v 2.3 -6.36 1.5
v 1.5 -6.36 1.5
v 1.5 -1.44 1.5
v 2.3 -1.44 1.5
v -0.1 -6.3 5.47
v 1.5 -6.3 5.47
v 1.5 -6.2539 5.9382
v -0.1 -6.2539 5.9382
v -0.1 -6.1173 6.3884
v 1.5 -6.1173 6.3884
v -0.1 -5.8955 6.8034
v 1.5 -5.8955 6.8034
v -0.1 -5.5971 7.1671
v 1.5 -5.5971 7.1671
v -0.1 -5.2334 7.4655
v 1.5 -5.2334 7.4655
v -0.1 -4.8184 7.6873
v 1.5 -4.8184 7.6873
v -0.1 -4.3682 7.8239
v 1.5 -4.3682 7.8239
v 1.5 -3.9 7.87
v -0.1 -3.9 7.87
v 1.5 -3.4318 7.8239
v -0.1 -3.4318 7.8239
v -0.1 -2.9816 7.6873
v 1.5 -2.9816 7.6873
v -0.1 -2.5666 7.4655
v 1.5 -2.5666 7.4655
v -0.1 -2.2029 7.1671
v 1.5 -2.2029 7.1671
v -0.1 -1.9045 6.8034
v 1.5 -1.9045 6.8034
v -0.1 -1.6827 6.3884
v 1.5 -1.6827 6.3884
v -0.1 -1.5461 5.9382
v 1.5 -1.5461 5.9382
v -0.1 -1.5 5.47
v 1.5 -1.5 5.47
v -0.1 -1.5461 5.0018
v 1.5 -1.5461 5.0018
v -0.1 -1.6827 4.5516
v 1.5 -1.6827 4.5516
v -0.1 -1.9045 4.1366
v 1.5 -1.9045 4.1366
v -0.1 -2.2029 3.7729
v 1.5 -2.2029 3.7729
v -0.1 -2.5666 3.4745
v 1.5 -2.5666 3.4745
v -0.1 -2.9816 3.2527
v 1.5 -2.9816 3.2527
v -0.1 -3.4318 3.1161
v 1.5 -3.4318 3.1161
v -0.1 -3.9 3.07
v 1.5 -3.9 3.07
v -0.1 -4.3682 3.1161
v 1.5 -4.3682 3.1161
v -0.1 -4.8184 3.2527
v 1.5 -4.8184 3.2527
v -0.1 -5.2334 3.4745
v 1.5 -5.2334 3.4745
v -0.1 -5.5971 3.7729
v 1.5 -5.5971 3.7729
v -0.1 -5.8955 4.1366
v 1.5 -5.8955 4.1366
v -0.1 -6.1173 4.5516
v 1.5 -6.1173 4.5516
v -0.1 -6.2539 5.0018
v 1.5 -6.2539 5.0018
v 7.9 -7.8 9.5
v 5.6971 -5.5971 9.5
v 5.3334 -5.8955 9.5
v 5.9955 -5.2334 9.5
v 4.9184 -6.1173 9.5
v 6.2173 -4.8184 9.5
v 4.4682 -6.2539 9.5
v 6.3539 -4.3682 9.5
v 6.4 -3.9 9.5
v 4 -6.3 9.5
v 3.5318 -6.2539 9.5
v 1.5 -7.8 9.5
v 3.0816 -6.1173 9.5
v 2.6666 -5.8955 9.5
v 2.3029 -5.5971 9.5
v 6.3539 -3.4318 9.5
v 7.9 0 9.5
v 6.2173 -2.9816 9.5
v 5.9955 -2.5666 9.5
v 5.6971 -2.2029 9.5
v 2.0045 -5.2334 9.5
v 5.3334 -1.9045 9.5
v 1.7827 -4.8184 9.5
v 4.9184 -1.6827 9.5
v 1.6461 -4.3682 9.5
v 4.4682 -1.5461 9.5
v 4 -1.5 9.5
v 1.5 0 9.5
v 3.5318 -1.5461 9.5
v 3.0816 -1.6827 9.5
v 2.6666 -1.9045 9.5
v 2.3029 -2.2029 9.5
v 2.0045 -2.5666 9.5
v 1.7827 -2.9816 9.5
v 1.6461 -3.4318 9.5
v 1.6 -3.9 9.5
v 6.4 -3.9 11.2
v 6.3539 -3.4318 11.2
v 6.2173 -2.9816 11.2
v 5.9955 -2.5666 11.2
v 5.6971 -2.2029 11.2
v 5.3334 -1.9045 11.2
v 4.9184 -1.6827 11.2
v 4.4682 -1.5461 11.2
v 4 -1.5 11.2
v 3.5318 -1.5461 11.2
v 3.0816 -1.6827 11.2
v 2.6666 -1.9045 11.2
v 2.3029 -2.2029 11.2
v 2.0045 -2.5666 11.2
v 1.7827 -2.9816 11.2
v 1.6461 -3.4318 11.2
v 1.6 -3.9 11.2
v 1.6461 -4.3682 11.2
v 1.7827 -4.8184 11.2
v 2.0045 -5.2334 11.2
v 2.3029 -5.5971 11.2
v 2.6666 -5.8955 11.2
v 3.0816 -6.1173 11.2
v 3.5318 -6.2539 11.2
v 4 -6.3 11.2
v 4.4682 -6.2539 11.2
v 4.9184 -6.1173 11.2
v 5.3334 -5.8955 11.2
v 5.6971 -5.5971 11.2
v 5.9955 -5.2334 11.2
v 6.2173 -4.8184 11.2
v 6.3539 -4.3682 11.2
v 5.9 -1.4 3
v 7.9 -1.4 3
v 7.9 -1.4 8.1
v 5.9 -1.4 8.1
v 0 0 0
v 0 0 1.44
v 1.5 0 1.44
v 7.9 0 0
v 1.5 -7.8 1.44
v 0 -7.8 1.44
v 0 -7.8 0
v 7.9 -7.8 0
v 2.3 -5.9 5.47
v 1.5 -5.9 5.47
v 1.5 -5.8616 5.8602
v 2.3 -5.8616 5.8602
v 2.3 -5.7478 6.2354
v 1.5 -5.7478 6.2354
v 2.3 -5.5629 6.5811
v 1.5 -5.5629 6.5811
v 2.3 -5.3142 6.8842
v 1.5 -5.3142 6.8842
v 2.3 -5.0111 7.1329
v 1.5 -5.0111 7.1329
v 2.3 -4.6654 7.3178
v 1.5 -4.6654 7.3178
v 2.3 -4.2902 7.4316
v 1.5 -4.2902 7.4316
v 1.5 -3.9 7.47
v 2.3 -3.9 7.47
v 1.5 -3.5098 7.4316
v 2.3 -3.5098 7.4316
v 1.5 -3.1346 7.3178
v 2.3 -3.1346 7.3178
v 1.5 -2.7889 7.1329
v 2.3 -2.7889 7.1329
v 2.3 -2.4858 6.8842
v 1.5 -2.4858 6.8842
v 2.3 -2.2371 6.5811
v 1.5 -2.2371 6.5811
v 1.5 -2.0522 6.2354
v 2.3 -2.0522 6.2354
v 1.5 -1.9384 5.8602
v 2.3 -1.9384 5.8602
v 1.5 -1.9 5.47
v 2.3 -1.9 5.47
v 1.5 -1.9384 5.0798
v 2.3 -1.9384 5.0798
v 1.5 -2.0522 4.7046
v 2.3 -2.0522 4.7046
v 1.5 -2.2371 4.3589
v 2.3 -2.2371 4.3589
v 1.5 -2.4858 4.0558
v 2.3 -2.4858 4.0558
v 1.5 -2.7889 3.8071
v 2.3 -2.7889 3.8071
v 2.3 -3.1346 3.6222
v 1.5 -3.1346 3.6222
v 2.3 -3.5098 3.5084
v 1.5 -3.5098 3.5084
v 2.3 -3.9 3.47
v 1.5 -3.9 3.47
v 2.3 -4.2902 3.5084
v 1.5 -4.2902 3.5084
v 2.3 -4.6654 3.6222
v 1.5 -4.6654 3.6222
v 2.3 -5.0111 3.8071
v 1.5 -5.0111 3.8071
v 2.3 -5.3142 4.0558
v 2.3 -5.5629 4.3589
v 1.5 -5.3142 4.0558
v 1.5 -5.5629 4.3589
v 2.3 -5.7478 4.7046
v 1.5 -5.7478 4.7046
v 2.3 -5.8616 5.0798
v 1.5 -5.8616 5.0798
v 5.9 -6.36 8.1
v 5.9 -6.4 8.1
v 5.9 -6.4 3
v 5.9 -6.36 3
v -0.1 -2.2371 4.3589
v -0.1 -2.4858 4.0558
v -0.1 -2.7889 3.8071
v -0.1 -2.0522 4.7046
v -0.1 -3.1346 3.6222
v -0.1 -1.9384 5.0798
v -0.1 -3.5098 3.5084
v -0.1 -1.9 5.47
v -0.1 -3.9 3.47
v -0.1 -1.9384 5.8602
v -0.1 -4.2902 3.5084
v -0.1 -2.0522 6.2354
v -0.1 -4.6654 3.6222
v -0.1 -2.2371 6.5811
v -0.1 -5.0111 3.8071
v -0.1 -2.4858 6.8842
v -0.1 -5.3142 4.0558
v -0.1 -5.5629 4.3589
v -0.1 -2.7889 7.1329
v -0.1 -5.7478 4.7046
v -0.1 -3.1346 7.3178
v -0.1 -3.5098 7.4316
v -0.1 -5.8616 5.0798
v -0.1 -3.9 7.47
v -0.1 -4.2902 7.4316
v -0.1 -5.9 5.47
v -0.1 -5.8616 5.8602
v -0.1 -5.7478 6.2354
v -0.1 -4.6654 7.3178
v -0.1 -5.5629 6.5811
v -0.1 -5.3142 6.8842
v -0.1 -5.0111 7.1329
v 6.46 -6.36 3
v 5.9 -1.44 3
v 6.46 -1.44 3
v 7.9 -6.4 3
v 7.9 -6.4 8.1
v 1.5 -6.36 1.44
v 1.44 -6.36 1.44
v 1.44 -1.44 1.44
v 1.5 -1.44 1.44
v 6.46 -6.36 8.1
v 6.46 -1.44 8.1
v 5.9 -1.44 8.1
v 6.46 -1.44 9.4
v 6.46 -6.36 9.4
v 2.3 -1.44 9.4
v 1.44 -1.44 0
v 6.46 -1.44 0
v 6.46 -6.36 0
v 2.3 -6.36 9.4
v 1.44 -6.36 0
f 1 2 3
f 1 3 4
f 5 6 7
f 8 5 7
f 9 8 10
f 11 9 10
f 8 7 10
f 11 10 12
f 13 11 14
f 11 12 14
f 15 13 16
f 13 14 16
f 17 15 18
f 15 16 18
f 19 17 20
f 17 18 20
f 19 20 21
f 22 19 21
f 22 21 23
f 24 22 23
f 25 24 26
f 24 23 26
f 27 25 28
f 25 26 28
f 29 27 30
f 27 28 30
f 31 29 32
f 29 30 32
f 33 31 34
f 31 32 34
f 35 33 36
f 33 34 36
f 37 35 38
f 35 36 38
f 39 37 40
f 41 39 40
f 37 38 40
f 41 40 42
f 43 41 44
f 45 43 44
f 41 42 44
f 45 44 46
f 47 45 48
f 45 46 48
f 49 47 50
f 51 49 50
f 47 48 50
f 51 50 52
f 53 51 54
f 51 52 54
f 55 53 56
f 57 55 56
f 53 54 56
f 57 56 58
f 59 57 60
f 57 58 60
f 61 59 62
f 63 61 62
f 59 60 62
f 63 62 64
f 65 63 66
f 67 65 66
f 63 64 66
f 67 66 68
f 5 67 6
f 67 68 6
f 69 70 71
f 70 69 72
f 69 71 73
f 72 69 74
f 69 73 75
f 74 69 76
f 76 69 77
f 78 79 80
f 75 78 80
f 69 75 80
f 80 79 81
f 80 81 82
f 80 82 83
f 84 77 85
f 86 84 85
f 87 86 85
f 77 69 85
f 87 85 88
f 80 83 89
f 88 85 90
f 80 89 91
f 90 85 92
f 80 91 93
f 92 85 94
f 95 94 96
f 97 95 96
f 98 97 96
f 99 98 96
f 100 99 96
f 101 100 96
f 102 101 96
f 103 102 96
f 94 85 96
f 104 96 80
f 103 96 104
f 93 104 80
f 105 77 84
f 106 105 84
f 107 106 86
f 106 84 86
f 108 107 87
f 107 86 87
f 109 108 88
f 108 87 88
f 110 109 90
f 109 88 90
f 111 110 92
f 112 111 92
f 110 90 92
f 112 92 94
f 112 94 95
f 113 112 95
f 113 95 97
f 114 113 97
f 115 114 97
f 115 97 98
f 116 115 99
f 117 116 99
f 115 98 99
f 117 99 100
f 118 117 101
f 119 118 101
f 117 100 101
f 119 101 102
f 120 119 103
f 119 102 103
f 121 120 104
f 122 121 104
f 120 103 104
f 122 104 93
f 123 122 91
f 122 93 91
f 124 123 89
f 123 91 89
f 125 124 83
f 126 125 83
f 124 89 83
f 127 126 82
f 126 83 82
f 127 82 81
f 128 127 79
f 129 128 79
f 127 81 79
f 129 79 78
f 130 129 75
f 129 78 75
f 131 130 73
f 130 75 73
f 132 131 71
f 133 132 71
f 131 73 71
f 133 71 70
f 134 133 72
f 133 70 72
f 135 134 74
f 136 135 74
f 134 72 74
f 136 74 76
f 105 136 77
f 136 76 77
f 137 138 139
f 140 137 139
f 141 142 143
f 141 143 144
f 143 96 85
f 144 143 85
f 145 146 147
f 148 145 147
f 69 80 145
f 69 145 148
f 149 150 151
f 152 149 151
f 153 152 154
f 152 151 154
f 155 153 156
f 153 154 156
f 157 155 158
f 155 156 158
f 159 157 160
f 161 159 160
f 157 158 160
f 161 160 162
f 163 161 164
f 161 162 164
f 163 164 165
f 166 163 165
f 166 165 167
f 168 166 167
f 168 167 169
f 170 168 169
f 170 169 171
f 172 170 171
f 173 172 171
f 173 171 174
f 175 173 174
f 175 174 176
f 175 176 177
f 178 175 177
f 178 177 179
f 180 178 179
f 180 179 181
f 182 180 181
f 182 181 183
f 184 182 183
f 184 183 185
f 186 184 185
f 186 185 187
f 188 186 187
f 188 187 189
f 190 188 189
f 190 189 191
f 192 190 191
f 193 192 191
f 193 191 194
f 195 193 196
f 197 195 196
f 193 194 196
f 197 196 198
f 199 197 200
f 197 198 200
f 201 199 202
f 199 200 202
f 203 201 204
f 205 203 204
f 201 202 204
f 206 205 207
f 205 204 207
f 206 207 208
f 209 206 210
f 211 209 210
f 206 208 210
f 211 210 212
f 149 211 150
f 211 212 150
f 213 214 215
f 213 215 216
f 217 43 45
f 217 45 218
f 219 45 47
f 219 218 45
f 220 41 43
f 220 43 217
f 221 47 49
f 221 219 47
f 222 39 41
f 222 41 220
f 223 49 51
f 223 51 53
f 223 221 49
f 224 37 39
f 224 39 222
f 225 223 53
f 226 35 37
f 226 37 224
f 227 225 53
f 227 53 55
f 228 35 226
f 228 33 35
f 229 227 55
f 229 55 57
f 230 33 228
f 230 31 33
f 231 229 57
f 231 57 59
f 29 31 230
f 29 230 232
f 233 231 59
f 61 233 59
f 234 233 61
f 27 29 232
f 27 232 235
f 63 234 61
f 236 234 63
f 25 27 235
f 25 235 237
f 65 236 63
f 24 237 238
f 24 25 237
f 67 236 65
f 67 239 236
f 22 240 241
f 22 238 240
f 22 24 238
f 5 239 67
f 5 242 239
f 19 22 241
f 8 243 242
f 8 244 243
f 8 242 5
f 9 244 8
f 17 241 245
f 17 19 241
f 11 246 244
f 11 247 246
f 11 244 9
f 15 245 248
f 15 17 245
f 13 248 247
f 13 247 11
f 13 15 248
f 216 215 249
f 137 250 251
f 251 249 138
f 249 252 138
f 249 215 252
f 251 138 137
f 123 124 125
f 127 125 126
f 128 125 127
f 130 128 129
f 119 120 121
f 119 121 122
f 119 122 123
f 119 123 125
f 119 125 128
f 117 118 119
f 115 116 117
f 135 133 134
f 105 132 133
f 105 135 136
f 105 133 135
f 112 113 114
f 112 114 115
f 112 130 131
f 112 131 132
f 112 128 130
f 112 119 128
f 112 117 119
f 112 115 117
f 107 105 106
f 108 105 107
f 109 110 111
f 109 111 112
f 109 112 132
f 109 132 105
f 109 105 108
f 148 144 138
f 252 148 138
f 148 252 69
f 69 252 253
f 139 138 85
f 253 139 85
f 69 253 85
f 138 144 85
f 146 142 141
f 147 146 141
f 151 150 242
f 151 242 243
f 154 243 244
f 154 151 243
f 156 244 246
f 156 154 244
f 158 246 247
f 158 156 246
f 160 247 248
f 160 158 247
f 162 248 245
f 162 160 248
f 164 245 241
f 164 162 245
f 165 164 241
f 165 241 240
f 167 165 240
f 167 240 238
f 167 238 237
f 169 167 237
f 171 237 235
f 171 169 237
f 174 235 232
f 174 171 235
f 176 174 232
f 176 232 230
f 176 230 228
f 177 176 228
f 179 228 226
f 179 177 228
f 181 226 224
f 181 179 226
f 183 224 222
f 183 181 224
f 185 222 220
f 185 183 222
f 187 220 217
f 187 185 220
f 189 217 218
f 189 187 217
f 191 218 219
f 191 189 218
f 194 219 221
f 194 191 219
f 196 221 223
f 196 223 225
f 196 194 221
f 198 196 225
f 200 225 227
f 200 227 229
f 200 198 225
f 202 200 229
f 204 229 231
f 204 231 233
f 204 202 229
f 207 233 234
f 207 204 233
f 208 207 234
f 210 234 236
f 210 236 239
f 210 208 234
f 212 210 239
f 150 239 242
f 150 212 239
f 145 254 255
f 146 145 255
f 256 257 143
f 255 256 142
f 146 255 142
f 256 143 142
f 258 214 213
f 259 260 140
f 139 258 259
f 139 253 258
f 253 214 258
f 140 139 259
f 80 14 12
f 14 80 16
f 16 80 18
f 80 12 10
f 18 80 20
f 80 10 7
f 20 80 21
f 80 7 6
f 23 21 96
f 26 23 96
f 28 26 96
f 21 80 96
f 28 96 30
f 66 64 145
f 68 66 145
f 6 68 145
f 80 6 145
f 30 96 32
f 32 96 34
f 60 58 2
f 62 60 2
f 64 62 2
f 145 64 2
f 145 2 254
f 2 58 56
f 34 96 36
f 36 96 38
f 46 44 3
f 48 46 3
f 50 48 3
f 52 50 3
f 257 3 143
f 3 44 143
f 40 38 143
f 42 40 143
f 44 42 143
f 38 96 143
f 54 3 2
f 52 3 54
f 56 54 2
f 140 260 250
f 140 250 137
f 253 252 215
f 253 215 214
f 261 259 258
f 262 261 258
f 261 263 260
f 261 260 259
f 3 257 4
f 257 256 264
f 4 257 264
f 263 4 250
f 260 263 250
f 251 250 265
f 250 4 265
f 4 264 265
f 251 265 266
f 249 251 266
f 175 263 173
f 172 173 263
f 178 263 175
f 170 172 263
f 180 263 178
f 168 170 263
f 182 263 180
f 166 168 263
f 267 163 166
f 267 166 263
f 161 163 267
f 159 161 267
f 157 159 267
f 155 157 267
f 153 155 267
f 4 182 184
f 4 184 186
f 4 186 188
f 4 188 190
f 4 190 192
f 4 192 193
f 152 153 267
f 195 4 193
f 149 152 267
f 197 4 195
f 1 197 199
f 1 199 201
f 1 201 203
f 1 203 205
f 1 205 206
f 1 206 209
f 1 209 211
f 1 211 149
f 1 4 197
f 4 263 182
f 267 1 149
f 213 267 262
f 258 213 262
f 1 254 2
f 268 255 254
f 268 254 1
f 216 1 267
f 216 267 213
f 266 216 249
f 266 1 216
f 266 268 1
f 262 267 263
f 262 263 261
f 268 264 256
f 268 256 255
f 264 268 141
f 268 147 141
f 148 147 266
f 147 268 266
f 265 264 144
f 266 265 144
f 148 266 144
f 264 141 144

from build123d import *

# Parameters (mm, degrees)
F1_DEPTH  = 7.8
F2_R      = 2.4
F3_DEPTH  = 1.7
F4_W      = 5.02
F4_H      = 4.92
F5_DEPTH  = 1.5
F6_W      = 4.16
F6_H      = 4.92
F7_DEPTH  = 7.9
F8_R      = 2.4
F8_R_2    = 2
F9_DEPTH  = 1.6
F10_DEPTH = 1
F11_W     = 5
F11_H     = 5.1
F12_DEPTH = 2


with BuildPart() as f1:
    # F0 (on Front) → F1 (new body)
    with BuildSketch(Plane.XZ):
        Polygon((0, 1.44), (0, 0), (7.9, 0), (7.9, 9.5), (1.5, 9.5), (1.5, 1.44), align=None)
    extrude(amount=F1_DEPTH)

    # F2 (on face) → F3 (join)
    with BuildSketch(Plane.XY.offset(9.5)):
        with Locations((4, -3.9)):
            Circle(F2_R)
    extrude(amount=F3_DEPTH)

    # F4 (on face) → F5 (cut)
    with BuildSketch(Plane(origin=(0, 0, 0), x_dir=(1, 0, 0), z_dir=(0, 0, -1))):
        with Locations((3.95, 3.9)):
            Rectangle(F4_W, F4_H)
    extrude(amount=-F5_DEPTH, mode=Mode.SUBTRACT)

    # F6 (on face) → F7 (cut)
    with BuildSketch(Plane(origin=(0, 0, 1.5), x_dir=(1, 0, 0), z_dir=(0, 0, -1))):
        with Locations((4.38, 3.9)):
            Rectangle(F6_W, F6_H)
    extrude(amount=-F7_DEPTH, mode=Mode.SUBTRACT)

    # F8 (on face) → F9 (join)
    with BuildSketch(Plane(origin=(1.5, 0, 0), x_dir=(0, -1, 0), z_dir=(-1, 0, 0))):
        with Locations((3.9, 5.47)):
            Circle(F8_R)
        with Locations((3.9, 5.47)):
            Circle(F8_R_2, mode=Mode.SUBTRACT)
    extrude(amount=F9_DEPTH)

    # F8 (on face) → F10 (cut)
    with BuildSketch(Plane(origin=(1.5, 0, 0), x_dir=(0, -1, 0), z_dir=(-1, 0, 0))):
        with Locations((3.9, 5.47)):
            Circle(F8_R_2)
    extrude(amount=-F10_DEPTH, mode=Mode.SUBTRACT)

    # F11 (on face) → F12 (cut)
    with BuildSketch(Plane.YZ.offset(7.9)):
        with Locations((-3.9, 5.55)):
            Rectangle(F11_W, F11_H)
    extrude(amount=-F12_DEPTH, mode=Mode.SUBTRACT)


solid = f1.part
